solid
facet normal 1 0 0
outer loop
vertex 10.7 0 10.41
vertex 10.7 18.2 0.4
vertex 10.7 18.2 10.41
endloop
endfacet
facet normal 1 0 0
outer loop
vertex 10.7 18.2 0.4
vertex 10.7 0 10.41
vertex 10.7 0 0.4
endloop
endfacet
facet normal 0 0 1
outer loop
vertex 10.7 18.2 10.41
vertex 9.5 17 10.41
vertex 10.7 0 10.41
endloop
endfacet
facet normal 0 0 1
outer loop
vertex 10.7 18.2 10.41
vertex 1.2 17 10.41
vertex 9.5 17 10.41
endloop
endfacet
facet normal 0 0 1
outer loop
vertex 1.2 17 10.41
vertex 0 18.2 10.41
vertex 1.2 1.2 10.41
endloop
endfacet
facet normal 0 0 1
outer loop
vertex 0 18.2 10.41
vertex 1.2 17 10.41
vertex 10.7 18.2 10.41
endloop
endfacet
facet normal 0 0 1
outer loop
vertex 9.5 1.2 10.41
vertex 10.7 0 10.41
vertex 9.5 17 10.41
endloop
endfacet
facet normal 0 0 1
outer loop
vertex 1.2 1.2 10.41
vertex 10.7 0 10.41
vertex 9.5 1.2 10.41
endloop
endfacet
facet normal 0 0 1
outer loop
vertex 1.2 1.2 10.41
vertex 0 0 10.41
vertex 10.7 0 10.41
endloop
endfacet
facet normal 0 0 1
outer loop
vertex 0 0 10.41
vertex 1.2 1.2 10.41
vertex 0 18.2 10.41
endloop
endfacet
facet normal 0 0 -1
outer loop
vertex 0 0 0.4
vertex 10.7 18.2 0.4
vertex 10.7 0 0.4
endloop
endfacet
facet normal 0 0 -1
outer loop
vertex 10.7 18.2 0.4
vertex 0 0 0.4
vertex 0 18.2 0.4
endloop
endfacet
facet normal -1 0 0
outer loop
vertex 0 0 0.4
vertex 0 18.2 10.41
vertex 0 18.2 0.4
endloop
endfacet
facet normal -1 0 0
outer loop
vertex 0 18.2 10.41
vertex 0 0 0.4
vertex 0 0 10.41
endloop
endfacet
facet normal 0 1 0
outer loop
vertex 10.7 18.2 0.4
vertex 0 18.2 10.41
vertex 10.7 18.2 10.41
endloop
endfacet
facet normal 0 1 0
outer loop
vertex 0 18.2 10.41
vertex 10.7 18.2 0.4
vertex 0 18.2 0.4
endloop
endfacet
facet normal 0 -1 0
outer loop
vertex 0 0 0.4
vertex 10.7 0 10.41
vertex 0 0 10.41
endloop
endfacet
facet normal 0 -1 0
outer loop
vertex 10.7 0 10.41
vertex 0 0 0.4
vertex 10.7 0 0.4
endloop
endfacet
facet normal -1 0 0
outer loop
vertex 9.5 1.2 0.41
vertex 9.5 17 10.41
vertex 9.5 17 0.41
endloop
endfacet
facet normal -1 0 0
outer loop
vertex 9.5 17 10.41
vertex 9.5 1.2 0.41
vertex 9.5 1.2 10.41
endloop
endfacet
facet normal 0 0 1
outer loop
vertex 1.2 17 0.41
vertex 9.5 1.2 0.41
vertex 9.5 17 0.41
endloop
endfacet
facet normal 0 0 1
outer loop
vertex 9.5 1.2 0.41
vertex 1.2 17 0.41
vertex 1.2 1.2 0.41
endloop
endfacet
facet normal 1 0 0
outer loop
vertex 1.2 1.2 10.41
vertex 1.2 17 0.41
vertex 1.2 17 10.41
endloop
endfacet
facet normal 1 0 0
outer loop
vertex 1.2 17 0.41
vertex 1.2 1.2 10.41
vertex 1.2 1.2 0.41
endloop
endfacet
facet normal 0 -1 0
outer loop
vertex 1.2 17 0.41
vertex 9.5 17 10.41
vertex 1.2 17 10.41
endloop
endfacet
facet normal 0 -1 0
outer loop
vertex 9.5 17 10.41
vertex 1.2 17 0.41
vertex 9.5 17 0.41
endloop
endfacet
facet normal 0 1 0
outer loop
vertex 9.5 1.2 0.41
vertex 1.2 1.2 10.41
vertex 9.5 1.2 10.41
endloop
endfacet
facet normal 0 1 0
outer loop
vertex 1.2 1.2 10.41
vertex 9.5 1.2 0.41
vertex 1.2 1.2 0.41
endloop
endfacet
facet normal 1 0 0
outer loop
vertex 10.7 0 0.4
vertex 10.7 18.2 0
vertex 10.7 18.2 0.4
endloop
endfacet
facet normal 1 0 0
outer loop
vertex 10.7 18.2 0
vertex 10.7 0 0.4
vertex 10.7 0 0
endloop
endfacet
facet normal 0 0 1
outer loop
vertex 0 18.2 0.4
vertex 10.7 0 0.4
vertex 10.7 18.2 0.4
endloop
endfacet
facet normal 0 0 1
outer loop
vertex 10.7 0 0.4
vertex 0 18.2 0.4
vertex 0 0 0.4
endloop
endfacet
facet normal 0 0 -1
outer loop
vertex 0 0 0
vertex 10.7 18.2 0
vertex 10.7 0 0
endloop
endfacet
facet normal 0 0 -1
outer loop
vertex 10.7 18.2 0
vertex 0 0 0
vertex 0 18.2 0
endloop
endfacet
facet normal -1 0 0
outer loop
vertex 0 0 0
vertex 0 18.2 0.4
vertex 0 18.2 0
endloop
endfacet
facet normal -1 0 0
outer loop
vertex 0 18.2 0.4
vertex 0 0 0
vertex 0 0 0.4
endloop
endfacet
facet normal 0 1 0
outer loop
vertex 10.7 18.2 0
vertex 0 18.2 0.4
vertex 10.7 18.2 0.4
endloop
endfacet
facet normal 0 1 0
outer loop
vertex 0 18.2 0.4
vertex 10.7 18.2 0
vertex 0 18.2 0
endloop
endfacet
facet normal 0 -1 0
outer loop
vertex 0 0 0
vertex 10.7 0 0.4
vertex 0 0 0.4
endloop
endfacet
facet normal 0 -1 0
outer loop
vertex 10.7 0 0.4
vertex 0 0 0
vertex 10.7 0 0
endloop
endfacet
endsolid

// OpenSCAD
// file: ../../Base/Boxes.scad
// Fischertechnik Box Foundation
// Pre-designed Boxes

use <Constants.scad>

include <PlacementOptions.scad>

box190Width = 190;
box190Depth = 130;
box130Width = 130;
box130Depth = 95;
boxUsageHeight = 33.9;
boxWallThickness = 2.4;
boxBaseThickness = 1.0;
boxWebWidth = 3.0;

// getBoxWallThickness()
// Gets the wall thickness of a Fischertechnik Box

function getBoxWallThickness() = boxWallThickness;

// Gets the usable height of a fischertechnik box
function getBoxUsageHeight() = boxUsageHeight;

// Gets the thickness of the Fischertechnik box base.
function getBoxBaseThickness() = boxBaseThickness;

// Gets the width of a box web
function getBoxWebWidth() = boxWebWidth;

// Gets the usable inner space of a Box 190 as an x/y-list
function getBox190Space() = [
    box190Width - 2*getBoxWallThickness(), 
    box190Depth - 2*getBoxWallThickness() ];

// Imports the Fischertechnik empty box 130x190 mm and places it at position 0,0
// 190x130 are the outer sizes, the inner space is slightly smaller. Use getBox190Space() to get the inner sizes.
// This module needs the STL file "Fischertechnik Box 130x190.stl" in the library path.
// The box is positioned that the usable inner space is at the 0,0,0 position. The

module Box190() {
    translate([-getBoxWallThickness(),-getBoxWallThickness(),-getBoxBaseThickness()])
        import("Fischertechnik Box 130x190.stl", convexity=3);
}

// Gets the usable inner space of a Box 130 as an x/y-list
function getBox130Space() = [
    box130Width - 2*getBoxWallThickness(), 
    box130Depth - 2*getBoxWallThickness() ];

// Imports the Fischertechnik empty box 95x130 mm and places it at position 0,0
// 190x130 are the outer sizes, the inner space is slightly smaller. Use getBox190Space() to get the inner sizes.
// This module needs the STL file "Fischertechnik Box 95x130.stl" in the library path.
// The box is positioned that the usable inner space is at the 0,0,0 position. The

module Box130() {
    translate([-getBoxWallThickness(),-getBoxWallThickness(),-getBoxBaseThickness()])
        import("Fischertechnik Box 95x130.stl", convexity=3);
}

// Creates a web at the specified box walls
// corner 0 = LowerLeft, 1 = UpperLeft, 2 = UpperRight, 3 = LowerRight
// side 0 = LeftOfCorner, 1 = RightOfCorner
// distance = Distance in mm from the corner
// box = inner width and depth of the box (default: Box 190)
// webWidth = length of the web (default is 3 mms)
// webThickness = thickness of the web (default is 1 mm)

module BoxWeb(corner, side, distance, box=getBox190Space(), webWidth=getBoxWebWidth(), webThickness=1.0) {
    sink = getBoxWallThickness()/2;

    width = (corner % 2 == 0) ? 
            (side == LeftOfCorner ? webWidth : webThickness) :
            (side == LeftOfCorner ? webThickness : webWidth);

    depth = (corner % 2 == 0) ? 
            (side == RightOfCorner ? webWidth : webThickness) :
            (side == RightOfCorner ? webThickness : webWidth);
    
    xDiff = corner == LowerLeft ? 
                (side == LeftOfCorner ? -sink : distance) :
            (corner == UpperLeft ?                
                (side == LeftOfCorner ? distance : -sink) :
            (corner == UpperRight ?
                (side == LeftOfCorner ? box.x-webWidth+sink : box.x-distance-webThickness) :
                (side == LeftOfCorner ? box.x-distance-webThickness: box.x-webWidth+sink)));

    yDiff = corner == LowerLeft ? 
                (side == RightOfCorner ? -sink : distance) :
            (corner == UpperLeft ?
                (side == RightOfCorner ? box.y-distance : box.y-webWidth+sink) :
            (corner == UpperRight ?
                (side == RightOfCorner ? box.y-webWidth+sink : box.y-distance) :
                (side == RightOfCorner ? distance : -sink)));
    
    translate([xDiff, yDiff, -getExcess()])
        cube([width, depth, boxUsageHeight + 2*getExcess()]);
}
// file: ../../Base/Rotation.scad
// Fischertechnik Box Foundation
// Geometry Helpers Rotation

include <PlacementOptions.scad>

// getRotatedSpace(space, rotation=NoRotation)
// Rotates the space dependent on the specified rotation

function getRotatedSpace(space, rotation=NoRotation) = [
    (rotation == Rotate90 || rotation == Rotate270) ? space.y : space.x,
    (rotation == Rotate90 || rotation == Rotate270) ? space.x : space.y
];

// Rotates the given space around the fixed left lower corner
// space = the space the children needs as width/depth list [width,depth]
// rotation = 0 Rotate0 degrees, 1 Rotate90 degrees, 2 Rotate180 degrees, 3 Rotate270 degrees (equivalent to -90)

module RotateFix(space, rotation=Rotate0) {
    dy = (rotation == Rotate0 || rotation == Rotate270) ? 0 :
        (rotation == Rotate90) ? space.x :
        space.y;
    dx = (rotation < Rotate180) ? 0 :
        (rotation == Rotate180) ? space.x :
        space.y;
    
    translate([dx, dy, 0])
        rotate([0, 0, rotations[rotation]])
            children();
}
// file: ../../Base/Alignment.scad
// Fischertechnik Box Foundation
// Geometry Helpers Alignment

include <PlacementOptions.scad>

// getAlignedX(elementWidth, spaceWidth, align=AlignRight, offset=0)
// Gets the aligned X offset of an element with the given
// width in the given space.
// elementWidth = The width of the element to positon
// spaceWidth = The space where the element should be aligned
// align = 0 AlignLeft, 1 AlignCenter, 2 AlignRight
// offset = an optional offset from the aligned position. When
// aligned left or centered, then positive values are in X direction.
// When aligned right then positive values are in negative X direction.

function getAlignedX(elementWidth, spaceWidth, align=AlignRight, offset=0) =
    (align == AlignLeft) ?
        offset :
        ((align == AlignCenter) ?
        (spaceWidth - elementWidth)/2 + offset :
        spaceWidth - offset - elementWidth);

// getAlignedY(elementDepth, spaceDepth, align=AlignTop, offset=0)
// Gets the aligned Y offset of an element with the given
// depth in the given space.
// elementDepth = The depth of the element to positon
// spaceDepth = The space where the element should be aligned
// align = 0 AlignBottom, 1 AlignCenter, 2 AlignTop
// offset = an optional offset from the aligned position. When
// aligned bottom or centered, then positive values are in Y direction.
// When aligned top then positive values are in negative Y direction.

function getAlignedY(elementDepth, spaceDepth, align=AlignTop, offset=0) =
    (align == AlignBottom) ?
        offset :
        ((align == AlignCenter) ?
        (spaceDepth - elementDepth)/2 + offset :
        spaceDepth - offset - elementDepth);
// file: ../../Base/PlacementOptions.scad
// Fischertechnik Box Foundation
// Placement Options

// Alignment
NoAlign = 0;
AlignLeft = 1;
AlignBottom = 2;
AlignCenter = 3;
AlignRight = 4;
AlignTop = 5;

// Element rotation degree steps
rotations = [0, -90, -180, -270];

// Rotation
NoRotation = 0;
Rotate0 = 0;
Rotate90 = 1;
Rotate180 = 2;
Rotate270 = 3;

// Docking (seen from above)
NoDock = -1;
DockLeft = 0;
DockTop = 1;
DockRight = 2;
DockCorner = 2;
DockBottom = 3;

// Web corners
LowerLeft = 0;
UpperLeft = 1;
UpperRight = 2;
LowerRight = 3;

// Web position relative to corner
LeftOfCorner = 0;
RightOfCorner = 1;
// file: ../../Base/Placement.scad
// Fischertechnik Box Foundation
// Geometry Helpers Placement

use <Constants.scad>
use <Alignment.scad>
use <Rotation.scad>
use <Boxes.scad>

include <PlacementOptions.scad>

// Place(x=0, y=0, elementSpace=[0,0], alignX=AlignLeft, alignY=AlignBottom, rotation=Rotate0, boxSpace=getBox190Space())
// Places the child at the specified position
// y = Y-Position. This is a relative position when an X aligment is specified.
// x = X-Position. This is a relative position when an Y aligment is specified.
// elementSpace = space of the element to be placed [x,y]
// alignX = -1=NoAlign, 0 AlignLeft, 1 AlignCenter, 3 AlignRight (elementSpace and boxSpace required!)
// alignY = -1=NoAlign, 2 AlignBottom, 1 AlignCenter, 4 AlignTop (elementSpace and boxSpace required!)
// rotation = 0 Rotate0 0 degrees, 1 Rotate90 90 degrees, 
// 2 Rotate180 180 degrees, 3 Rotate270 270 degrees (equivalent to -90)
// boxSpace = Inner space of the box where the placement occurs [x,y] - default is Box 190x130 inner space

module Place(x=0, y=0, elementSpace=[0,0], 
  alignX=AlignLeft, alignY=AlignBottom, 
  rotation=NoRotation, boxSpace=getBox190Space()) {

    module Position(x, y, space, rotation=Rotate0) {
        translate([x, y, 0])
            RotateFix(space, rotation)
                children();
    }

    space = getRotatedSpace(elementSpace, rotation);
    alignedX = getAlignedX(space.x, boxSpace.x, alignX, x);
    alignedY = getAlignedY(space.y, boxSpace.y, alignY, y);
    Position(alignedX, alignedY, elementSpace, rotation)
        children();
}

// Center(space=getBox130Space(), elementSpace=[0,0])
// space = Space where the children is centered. For cylinder use centered=true and no elementSpace.
// elementSpace = space of the element to be centered [x,y]

module Center(space=getBox190Space(), elementSpace=[0,0]) {
    translate([(space.x - elementSpace.x) / 2, (space.y - elementSpace.y) / 2])
        children(0);
}

// CenterHorizontal(width=0, y=0, offset=0, space=getBox130Space())
// space = Space where the children is centered. For cylinder use centered=true and no elementSpace.
// elementSpace = space of the element to be centered [x,y]

module CenterHorizontal(width=0, y=0, offset=0, space=getBox190Space()) {
    translate([(space.x - width) / 2 + offset, y])
        children(0);
}

// CenterVertical(depth=0, x=0, offset=0, space=getBox130Space())
// space = Space where the children is centered. For cylinder use centered=true and no elementSpace.
// elementSpace = space of the element to be centered [x,y]

module CenterVertical(depth=0, x=0, offset=0, space=getBox190Space()) {
    translate([x, (space.y - depth) / 2 + offset])
        children(0);
}
// file: ../../Elements/AxisClip10.scad
// Fischertechnik Box Library
// Axis for clip 10
// 31023

use <../ModelBase/Simple.scad>

width = 12;
depth = 12;
height = 23;

// getAxisClip10Space()
// Gets the space of a frame for a clip 10 with spring ring (mot2)

function getAxisClip10Space() = [width, depth, height];

// AxisClip10()
// Axis for clip 10 with spring ring (mot2)

module AxisClip10() {
    LeveledAxisWithSpace(height, height-10, getAxisClip10Space());
}

// Tests
color("lightgray")
AxisClip10();
// file: ../../Base/Constants.scad
// Fischertechnik Box Foundation
// Constants

// Constant values necessary for multiple elements

// Base constants
dividerThickness = 1.2;
excess = 0.01;
fragments = 90;
tolerance = 0.8;

// Gets the thickness of a divider 
function getDividerThickness() = dividerThickness;

// Gets the excess that is used to merge walls into each other
function getExcess() = excess;

// Gets amount of fragments of a cylinder
function getFragments() = fragments;

// Gets the inner tolerance of a frame to each side
function getTolerance() = tolerance;


// Fischertechnik specific constants
axisDiameter = 4;
axisBottomDiameter = axisDiameter + 1;
standardEdgeDistance = 2.5;
standardWebDistance = 11.5;
standardCornerLength = 15;
tubeWallFactor = 0.8;

// Gets axis diameter
function getAxisDiameter() = axisDiameter;

// Gets axis bottom diameter for thicker part at the bottom
function getAxisBottomDiameter() = axisBottomDiameter;

// gets the standard distance to the wall of the box for dockable frames with webs
function getStandardEdgeDistance() = standardEdgeDistance;

// gets the standard distance of each web to the corner of the dockable frame
function getStandardWebDistance() = standardWebDistance;

// gets the standard length of the corner walls of a dockable frame
function getStandardCornerLength() = standardCornerLength;

// gets the wall thickness of a tube.
function getTubeWallThickness() = tubeWallFactor * getDividerThickness();
// file: ../../Elements/FrameSmallBlock.scad
// Fischertechnik Box Library
// Frame for small blocks 5 or 7.5 mm
// 37237 and 37238

use <../ModelBase/Simple.scad>

width = 7.5;
depth = 15;
height = 10;

// getFrameSmallBlockSpace(columns=1, rows=1)
// Gets the space of a frame for columns x rows small parts (7.5 or 5)

function getFrameSmallBlockSpace(columns=1, rows=1) = getFrameOuterVolume([width * columns, depth * rows, height]);

// FrameSmallBlock(columns=1, rows=1)
// frame for columns x rows small parts (7.5 or 5)

module FrameSmallBlock(columns=1, rows=1) {
    Frame([width * columns, depth * rows, height]);
}

// Tests
color("lightgray")
FrameSmallBlock();
// file: ../TestPrint.scad
// 3D Print Test Base

use <../Base/Constants.scad>

use <../Elements/AxisClip10.scad>

module TestPrint(elementSpace) {
    cube([elementSpace.x, elementSpace.y, 0.4]);
    translate([0,0,0.4+getExcess()]) {
        children();
    }
}

TestPrint(getAxisClip10Space())
    AxisClip10();
// main file
// 3D Print Test Base
// FrameSmallBlock

use <../TestPrint.scad>
use <../../Elements/FrameSmallBlock.scad>

TestPrint(getFrameSmallBlockSpace())
    FrameSmallBlock();
